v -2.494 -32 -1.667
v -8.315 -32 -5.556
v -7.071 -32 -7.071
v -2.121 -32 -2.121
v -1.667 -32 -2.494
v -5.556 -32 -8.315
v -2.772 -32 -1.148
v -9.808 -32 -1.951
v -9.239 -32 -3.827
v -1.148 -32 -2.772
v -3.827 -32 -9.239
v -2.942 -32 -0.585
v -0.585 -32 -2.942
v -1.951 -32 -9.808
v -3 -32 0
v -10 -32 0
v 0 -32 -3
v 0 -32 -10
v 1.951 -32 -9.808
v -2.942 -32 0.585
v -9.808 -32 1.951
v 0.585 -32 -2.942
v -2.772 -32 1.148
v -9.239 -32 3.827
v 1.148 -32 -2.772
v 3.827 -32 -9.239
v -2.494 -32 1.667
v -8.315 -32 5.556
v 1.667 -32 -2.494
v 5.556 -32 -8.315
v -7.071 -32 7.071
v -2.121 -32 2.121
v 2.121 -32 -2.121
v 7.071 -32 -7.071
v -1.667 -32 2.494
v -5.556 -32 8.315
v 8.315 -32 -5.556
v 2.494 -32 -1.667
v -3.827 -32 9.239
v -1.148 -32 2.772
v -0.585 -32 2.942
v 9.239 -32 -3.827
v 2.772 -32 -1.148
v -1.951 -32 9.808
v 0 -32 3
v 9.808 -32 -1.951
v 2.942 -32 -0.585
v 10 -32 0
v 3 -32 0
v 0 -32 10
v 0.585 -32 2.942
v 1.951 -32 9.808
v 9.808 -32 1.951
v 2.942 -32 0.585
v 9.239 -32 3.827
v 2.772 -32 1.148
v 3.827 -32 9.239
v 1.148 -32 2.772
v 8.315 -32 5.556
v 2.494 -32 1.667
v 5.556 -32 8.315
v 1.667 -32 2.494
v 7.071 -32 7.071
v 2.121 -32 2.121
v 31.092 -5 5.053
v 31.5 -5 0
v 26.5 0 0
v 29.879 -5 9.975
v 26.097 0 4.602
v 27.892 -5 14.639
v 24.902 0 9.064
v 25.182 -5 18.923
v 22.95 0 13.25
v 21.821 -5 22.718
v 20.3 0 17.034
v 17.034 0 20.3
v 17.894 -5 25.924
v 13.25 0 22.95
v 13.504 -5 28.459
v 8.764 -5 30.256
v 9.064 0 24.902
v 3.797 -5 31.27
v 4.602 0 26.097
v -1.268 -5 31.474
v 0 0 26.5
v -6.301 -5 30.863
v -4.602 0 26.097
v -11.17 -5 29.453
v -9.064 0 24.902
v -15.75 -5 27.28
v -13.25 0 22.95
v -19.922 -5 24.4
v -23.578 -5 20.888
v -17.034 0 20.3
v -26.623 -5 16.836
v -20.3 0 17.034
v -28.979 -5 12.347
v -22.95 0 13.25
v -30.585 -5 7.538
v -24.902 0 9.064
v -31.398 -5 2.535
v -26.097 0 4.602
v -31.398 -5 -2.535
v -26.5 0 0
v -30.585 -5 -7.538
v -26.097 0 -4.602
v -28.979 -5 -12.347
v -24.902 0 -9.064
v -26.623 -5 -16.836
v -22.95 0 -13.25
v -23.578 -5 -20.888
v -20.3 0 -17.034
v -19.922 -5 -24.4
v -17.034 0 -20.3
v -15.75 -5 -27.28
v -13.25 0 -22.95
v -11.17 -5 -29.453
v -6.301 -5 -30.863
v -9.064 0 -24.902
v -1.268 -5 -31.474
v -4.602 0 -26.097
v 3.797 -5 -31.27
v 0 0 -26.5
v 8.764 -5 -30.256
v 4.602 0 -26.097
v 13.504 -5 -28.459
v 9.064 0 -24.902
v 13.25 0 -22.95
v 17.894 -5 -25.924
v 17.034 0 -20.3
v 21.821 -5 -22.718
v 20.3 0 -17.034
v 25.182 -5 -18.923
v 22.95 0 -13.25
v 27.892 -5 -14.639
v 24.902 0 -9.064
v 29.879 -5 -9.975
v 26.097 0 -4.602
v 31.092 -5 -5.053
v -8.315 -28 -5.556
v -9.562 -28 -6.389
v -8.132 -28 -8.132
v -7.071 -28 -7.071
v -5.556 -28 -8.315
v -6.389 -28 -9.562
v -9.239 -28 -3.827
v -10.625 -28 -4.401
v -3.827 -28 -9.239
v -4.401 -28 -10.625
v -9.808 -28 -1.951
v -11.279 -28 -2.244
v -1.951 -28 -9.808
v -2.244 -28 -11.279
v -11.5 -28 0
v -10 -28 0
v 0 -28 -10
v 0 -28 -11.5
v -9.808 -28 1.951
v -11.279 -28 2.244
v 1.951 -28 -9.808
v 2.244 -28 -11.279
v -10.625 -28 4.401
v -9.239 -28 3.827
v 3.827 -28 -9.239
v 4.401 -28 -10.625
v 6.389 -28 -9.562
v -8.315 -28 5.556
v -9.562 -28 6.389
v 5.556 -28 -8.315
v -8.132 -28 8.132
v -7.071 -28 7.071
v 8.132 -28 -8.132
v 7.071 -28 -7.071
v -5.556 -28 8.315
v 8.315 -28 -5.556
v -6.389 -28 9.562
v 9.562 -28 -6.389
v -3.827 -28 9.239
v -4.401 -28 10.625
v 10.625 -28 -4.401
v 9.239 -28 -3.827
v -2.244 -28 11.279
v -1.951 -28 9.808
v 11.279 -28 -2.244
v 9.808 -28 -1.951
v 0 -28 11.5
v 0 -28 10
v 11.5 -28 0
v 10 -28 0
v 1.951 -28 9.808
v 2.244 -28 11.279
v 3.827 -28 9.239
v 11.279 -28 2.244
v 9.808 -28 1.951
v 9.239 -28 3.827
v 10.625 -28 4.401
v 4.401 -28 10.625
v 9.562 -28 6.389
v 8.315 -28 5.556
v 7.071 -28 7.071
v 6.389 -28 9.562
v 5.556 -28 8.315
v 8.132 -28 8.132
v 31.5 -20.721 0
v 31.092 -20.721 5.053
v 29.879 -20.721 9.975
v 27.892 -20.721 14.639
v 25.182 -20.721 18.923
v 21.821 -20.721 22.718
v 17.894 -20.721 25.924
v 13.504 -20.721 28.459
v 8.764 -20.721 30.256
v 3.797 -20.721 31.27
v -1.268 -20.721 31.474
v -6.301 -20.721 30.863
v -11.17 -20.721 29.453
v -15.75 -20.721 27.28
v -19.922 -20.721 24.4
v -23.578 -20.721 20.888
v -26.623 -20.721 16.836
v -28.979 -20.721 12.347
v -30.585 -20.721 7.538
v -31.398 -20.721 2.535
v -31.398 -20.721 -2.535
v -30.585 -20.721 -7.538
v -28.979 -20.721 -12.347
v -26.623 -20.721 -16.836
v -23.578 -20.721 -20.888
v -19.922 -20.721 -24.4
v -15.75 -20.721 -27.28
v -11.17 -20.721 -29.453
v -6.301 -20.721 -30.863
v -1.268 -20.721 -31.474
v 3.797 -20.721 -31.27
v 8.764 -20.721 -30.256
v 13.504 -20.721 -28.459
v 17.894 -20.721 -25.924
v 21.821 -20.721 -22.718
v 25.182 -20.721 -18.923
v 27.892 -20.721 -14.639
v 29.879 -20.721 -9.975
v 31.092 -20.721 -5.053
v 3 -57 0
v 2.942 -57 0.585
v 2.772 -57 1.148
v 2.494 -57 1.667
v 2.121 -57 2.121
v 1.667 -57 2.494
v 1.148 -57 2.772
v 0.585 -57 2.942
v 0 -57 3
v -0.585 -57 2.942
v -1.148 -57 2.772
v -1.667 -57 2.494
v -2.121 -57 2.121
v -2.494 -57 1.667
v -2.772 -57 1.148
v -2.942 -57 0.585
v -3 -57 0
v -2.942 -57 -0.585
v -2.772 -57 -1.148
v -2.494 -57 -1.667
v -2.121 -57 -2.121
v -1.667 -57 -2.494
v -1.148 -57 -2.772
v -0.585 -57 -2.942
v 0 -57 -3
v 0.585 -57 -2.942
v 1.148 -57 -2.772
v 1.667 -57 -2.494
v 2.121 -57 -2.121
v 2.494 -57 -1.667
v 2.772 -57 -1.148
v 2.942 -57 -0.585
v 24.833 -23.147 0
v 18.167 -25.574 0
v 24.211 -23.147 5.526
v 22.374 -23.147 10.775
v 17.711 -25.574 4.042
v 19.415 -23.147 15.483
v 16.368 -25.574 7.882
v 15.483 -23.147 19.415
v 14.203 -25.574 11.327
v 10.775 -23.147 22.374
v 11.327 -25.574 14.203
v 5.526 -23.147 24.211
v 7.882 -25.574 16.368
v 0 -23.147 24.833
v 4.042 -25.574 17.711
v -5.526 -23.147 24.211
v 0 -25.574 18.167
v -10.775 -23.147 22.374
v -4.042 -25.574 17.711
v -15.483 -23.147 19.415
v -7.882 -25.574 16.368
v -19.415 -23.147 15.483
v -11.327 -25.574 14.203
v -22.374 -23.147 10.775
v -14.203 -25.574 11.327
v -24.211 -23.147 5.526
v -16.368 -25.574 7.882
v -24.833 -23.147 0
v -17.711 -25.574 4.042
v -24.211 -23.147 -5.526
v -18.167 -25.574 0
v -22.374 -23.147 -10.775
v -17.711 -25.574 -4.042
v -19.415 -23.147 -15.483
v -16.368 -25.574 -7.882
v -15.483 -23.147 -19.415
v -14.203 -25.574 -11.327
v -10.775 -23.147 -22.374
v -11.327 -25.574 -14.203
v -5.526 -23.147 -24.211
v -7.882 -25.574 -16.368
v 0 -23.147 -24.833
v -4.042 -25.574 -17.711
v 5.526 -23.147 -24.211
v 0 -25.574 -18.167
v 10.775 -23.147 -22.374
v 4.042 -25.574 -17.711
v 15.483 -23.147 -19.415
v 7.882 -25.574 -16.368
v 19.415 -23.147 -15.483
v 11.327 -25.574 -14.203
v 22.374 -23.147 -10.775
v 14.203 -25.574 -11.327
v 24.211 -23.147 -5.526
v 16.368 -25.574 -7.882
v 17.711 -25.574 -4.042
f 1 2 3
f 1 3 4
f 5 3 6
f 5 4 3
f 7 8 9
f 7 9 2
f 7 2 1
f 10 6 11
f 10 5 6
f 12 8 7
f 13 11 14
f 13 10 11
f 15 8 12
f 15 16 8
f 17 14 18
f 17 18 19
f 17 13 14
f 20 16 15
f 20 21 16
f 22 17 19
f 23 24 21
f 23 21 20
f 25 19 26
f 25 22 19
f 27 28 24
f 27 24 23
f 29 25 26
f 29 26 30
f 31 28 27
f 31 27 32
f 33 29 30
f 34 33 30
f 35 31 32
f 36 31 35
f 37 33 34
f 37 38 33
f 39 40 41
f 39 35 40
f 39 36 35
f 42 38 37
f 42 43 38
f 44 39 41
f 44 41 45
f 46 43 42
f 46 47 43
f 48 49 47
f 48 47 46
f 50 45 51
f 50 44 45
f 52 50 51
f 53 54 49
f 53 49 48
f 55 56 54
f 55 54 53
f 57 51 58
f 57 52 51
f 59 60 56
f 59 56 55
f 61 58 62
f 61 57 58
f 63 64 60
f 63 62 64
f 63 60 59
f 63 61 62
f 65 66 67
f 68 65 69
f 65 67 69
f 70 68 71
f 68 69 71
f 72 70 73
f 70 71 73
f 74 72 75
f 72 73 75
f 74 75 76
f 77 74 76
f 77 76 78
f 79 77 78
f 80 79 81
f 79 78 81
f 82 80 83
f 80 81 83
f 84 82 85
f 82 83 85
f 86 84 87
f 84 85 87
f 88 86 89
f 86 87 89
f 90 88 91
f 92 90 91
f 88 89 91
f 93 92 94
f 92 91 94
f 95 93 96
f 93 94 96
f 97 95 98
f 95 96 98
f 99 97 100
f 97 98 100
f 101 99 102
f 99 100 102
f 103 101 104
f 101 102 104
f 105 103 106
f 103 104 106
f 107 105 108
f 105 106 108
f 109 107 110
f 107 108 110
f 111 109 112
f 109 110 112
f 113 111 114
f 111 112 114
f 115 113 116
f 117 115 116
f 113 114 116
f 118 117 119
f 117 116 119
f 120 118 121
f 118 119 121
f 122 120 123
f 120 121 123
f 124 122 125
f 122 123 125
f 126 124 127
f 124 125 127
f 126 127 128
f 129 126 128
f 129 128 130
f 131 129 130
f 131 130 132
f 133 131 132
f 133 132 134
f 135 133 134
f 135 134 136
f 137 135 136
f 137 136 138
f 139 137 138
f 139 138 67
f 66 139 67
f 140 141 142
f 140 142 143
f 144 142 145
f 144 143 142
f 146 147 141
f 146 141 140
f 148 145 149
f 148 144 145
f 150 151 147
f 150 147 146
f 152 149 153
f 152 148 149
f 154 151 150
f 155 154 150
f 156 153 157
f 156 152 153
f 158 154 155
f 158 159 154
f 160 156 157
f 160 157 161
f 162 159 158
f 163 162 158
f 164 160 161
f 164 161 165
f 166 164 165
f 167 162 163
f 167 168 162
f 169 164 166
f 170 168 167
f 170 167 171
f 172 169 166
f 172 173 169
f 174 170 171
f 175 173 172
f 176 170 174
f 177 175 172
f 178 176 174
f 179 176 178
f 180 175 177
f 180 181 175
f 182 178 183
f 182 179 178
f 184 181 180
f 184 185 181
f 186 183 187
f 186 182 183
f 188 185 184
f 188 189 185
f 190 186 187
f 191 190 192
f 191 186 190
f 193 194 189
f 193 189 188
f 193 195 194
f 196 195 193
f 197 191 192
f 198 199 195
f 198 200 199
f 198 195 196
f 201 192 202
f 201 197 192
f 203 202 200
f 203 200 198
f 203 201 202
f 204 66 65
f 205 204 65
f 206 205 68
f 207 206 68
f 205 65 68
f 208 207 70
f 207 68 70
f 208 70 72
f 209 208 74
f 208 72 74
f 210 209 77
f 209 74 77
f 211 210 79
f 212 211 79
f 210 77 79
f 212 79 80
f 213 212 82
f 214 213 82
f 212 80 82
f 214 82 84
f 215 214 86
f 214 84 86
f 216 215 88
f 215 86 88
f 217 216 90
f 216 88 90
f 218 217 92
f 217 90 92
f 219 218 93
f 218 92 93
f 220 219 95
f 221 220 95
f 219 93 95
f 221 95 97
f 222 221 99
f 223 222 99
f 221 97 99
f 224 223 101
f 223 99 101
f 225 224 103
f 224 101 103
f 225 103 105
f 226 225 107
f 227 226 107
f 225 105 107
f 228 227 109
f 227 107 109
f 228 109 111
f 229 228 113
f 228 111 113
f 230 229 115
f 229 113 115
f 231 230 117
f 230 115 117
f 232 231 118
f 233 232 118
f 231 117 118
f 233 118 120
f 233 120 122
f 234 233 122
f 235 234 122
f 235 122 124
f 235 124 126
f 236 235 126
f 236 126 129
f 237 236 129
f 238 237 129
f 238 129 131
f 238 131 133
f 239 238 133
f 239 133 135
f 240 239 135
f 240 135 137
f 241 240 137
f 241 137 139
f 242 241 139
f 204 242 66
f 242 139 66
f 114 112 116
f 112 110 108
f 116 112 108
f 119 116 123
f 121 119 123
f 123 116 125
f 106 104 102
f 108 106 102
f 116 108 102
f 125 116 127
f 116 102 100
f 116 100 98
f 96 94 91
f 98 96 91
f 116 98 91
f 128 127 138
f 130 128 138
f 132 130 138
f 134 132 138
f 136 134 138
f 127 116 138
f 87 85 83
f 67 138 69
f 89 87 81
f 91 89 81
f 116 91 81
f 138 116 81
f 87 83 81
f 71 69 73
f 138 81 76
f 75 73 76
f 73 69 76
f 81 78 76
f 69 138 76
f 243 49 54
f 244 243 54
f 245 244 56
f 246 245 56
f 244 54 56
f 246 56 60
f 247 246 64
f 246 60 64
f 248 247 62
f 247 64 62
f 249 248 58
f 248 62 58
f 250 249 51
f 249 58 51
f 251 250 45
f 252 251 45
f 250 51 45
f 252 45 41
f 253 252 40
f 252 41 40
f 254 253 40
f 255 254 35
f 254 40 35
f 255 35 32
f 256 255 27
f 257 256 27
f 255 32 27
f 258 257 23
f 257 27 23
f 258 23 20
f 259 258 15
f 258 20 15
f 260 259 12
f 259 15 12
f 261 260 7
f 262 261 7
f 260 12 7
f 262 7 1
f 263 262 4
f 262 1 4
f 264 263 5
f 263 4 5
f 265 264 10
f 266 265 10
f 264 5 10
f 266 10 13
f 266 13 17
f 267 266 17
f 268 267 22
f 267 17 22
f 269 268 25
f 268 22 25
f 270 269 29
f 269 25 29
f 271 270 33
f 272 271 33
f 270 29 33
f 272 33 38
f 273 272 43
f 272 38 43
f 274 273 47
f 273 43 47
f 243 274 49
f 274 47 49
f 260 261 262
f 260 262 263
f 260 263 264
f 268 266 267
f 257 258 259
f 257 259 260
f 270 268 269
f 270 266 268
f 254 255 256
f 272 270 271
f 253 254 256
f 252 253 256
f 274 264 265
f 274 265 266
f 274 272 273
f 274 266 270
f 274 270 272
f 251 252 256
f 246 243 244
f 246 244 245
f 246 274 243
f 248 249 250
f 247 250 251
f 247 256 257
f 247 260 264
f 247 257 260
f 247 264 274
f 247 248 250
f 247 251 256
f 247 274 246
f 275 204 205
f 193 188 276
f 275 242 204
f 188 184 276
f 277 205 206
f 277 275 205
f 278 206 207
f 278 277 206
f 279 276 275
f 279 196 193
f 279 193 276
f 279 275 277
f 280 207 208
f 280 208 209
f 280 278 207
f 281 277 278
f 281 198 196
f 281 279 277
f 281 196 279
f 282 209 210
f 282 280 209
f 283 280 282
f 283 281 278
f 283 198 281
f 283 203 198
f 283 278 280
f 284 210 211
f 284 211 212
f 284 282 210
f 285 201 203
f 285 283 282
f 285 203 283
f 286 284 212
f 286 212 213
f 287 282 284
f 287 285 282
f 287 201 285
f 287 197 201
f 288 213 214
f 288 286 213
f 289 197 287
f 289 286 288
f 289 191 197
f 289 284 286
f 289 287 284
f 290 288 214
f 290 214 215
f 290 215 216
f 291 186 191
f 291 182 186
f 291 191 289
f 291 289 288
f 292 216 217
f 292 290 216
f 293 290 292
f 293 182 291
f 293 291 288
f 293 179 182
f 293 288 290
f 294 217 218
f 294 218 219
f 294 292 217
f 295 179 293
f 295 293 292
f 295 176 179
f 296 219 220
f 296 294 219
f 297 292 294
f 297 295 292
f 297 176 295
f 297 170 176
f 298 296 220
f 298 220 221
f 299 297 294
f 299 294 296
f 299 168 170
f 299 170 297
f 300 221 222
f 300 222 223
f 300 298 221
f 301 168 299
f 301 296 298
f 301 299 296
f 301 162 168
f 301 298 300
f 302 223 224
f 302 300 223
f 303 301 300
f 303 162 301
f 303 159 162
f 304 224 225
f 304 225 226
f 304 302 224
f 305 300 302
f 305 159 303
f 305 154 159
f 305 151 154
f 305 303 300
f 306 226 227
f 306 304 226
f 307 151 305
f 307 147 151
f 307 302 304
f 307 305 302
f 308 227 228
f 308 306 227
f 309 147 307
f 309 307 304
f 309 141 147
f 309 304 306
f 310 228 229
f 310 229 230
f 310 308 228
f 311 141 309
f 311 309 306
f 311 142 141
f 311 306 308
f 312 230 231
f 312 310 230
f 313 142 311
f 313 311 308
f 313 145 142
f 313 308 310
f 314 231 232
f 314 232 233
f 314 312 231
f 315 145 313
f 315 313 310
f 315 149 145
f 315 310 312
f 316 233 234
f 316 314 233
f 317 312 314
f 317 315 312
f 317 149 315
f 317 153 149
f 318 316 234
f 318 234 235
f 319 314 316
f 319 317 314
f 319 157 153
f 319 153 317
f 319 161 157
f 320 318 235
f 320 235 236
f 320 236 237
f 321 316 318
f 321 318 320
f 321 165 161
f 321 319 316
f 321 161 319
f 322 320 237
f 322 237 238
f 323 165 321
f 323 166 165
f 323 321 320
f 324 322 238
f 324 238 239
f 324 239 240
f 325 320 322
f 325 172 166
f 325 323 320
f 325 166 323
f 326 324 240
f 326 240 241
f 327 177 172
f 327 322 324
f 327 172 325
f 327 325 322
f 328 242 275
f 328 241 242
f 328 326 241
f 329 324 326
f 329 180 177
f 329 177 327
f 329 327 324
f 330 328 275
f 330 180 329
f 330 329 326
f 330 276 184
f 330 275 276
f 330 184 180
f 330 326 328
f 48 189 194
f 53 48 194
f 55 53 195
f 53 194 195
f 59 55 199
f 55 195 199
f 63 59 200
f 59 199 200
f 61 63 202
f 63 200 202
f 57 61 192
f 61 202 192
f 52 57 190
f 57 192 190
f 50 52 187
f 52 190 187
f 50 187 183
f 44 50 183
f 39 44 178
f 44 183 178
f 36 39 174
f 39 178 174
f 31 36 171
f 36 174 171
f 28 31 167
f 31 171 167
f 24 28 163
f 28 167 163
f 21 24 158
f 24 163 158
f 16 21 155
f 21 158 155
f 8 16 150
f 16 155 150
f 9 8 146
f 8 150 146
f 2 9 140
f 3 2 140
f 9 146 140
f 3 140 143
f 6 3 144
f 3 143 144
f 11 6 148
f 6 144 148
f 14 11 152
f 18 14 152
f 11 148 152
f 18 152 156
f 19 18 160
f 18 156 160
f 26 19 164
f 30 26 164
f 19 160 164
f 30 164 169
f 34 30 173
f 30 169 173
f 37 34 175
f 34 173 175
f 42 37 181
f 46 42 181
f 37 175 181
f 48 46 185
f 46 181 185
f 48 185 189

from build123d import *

# Parameters (mm, degrees)
F0_R     = 31.5
F1_DEPTH = 28
F2_SIZE2 = 20
F2_SIZE  = 7.2794046853
F3_SIZE  = 5
F4_R     = 10
F5_DEPTH = 4
F6_R     = 3
F7_DEPTH = 25


with BuildPart() as f1:
    # F0 (on Front) → F1 (new body)
    with BuildSketch(Plane.XZ):
        Circle(F0_R)
    extrude(amount=F1_DEPTH)

    # F2
    f2_edges = [f1.edges().sort_by_distance(p)[0] for p in [
        (-31.5, -28, 0),
    ]]
    f2_side = f1.faces().sort_by_distance((-31.5, -14, 0))[0]
    chamfer(f2_edges, length=F2_SIZE, length2=F2_SIZE2, reference=f2_side)

    # F3
    f3_edges = [f1.edges().sort_by_distance(p)[0] for p in [
        (-31.5, 0, 0),
    ]]
    chamfer(f3_edges, length=F3_SIZE)

    # F4 (on face) → F5 (join)
    with BuildSketch(Plane.XZ.offset(28)):
        Circle(F4_R)
    extrude(amount=F5_DEPTH)

    # F6 (on face) → F7 (join)
    with BuildSketch(Plane.XZ.offset(32)):
        Circle(F6_R)
    extrude(amount=F7_DEPTH)


solid = f1.part
